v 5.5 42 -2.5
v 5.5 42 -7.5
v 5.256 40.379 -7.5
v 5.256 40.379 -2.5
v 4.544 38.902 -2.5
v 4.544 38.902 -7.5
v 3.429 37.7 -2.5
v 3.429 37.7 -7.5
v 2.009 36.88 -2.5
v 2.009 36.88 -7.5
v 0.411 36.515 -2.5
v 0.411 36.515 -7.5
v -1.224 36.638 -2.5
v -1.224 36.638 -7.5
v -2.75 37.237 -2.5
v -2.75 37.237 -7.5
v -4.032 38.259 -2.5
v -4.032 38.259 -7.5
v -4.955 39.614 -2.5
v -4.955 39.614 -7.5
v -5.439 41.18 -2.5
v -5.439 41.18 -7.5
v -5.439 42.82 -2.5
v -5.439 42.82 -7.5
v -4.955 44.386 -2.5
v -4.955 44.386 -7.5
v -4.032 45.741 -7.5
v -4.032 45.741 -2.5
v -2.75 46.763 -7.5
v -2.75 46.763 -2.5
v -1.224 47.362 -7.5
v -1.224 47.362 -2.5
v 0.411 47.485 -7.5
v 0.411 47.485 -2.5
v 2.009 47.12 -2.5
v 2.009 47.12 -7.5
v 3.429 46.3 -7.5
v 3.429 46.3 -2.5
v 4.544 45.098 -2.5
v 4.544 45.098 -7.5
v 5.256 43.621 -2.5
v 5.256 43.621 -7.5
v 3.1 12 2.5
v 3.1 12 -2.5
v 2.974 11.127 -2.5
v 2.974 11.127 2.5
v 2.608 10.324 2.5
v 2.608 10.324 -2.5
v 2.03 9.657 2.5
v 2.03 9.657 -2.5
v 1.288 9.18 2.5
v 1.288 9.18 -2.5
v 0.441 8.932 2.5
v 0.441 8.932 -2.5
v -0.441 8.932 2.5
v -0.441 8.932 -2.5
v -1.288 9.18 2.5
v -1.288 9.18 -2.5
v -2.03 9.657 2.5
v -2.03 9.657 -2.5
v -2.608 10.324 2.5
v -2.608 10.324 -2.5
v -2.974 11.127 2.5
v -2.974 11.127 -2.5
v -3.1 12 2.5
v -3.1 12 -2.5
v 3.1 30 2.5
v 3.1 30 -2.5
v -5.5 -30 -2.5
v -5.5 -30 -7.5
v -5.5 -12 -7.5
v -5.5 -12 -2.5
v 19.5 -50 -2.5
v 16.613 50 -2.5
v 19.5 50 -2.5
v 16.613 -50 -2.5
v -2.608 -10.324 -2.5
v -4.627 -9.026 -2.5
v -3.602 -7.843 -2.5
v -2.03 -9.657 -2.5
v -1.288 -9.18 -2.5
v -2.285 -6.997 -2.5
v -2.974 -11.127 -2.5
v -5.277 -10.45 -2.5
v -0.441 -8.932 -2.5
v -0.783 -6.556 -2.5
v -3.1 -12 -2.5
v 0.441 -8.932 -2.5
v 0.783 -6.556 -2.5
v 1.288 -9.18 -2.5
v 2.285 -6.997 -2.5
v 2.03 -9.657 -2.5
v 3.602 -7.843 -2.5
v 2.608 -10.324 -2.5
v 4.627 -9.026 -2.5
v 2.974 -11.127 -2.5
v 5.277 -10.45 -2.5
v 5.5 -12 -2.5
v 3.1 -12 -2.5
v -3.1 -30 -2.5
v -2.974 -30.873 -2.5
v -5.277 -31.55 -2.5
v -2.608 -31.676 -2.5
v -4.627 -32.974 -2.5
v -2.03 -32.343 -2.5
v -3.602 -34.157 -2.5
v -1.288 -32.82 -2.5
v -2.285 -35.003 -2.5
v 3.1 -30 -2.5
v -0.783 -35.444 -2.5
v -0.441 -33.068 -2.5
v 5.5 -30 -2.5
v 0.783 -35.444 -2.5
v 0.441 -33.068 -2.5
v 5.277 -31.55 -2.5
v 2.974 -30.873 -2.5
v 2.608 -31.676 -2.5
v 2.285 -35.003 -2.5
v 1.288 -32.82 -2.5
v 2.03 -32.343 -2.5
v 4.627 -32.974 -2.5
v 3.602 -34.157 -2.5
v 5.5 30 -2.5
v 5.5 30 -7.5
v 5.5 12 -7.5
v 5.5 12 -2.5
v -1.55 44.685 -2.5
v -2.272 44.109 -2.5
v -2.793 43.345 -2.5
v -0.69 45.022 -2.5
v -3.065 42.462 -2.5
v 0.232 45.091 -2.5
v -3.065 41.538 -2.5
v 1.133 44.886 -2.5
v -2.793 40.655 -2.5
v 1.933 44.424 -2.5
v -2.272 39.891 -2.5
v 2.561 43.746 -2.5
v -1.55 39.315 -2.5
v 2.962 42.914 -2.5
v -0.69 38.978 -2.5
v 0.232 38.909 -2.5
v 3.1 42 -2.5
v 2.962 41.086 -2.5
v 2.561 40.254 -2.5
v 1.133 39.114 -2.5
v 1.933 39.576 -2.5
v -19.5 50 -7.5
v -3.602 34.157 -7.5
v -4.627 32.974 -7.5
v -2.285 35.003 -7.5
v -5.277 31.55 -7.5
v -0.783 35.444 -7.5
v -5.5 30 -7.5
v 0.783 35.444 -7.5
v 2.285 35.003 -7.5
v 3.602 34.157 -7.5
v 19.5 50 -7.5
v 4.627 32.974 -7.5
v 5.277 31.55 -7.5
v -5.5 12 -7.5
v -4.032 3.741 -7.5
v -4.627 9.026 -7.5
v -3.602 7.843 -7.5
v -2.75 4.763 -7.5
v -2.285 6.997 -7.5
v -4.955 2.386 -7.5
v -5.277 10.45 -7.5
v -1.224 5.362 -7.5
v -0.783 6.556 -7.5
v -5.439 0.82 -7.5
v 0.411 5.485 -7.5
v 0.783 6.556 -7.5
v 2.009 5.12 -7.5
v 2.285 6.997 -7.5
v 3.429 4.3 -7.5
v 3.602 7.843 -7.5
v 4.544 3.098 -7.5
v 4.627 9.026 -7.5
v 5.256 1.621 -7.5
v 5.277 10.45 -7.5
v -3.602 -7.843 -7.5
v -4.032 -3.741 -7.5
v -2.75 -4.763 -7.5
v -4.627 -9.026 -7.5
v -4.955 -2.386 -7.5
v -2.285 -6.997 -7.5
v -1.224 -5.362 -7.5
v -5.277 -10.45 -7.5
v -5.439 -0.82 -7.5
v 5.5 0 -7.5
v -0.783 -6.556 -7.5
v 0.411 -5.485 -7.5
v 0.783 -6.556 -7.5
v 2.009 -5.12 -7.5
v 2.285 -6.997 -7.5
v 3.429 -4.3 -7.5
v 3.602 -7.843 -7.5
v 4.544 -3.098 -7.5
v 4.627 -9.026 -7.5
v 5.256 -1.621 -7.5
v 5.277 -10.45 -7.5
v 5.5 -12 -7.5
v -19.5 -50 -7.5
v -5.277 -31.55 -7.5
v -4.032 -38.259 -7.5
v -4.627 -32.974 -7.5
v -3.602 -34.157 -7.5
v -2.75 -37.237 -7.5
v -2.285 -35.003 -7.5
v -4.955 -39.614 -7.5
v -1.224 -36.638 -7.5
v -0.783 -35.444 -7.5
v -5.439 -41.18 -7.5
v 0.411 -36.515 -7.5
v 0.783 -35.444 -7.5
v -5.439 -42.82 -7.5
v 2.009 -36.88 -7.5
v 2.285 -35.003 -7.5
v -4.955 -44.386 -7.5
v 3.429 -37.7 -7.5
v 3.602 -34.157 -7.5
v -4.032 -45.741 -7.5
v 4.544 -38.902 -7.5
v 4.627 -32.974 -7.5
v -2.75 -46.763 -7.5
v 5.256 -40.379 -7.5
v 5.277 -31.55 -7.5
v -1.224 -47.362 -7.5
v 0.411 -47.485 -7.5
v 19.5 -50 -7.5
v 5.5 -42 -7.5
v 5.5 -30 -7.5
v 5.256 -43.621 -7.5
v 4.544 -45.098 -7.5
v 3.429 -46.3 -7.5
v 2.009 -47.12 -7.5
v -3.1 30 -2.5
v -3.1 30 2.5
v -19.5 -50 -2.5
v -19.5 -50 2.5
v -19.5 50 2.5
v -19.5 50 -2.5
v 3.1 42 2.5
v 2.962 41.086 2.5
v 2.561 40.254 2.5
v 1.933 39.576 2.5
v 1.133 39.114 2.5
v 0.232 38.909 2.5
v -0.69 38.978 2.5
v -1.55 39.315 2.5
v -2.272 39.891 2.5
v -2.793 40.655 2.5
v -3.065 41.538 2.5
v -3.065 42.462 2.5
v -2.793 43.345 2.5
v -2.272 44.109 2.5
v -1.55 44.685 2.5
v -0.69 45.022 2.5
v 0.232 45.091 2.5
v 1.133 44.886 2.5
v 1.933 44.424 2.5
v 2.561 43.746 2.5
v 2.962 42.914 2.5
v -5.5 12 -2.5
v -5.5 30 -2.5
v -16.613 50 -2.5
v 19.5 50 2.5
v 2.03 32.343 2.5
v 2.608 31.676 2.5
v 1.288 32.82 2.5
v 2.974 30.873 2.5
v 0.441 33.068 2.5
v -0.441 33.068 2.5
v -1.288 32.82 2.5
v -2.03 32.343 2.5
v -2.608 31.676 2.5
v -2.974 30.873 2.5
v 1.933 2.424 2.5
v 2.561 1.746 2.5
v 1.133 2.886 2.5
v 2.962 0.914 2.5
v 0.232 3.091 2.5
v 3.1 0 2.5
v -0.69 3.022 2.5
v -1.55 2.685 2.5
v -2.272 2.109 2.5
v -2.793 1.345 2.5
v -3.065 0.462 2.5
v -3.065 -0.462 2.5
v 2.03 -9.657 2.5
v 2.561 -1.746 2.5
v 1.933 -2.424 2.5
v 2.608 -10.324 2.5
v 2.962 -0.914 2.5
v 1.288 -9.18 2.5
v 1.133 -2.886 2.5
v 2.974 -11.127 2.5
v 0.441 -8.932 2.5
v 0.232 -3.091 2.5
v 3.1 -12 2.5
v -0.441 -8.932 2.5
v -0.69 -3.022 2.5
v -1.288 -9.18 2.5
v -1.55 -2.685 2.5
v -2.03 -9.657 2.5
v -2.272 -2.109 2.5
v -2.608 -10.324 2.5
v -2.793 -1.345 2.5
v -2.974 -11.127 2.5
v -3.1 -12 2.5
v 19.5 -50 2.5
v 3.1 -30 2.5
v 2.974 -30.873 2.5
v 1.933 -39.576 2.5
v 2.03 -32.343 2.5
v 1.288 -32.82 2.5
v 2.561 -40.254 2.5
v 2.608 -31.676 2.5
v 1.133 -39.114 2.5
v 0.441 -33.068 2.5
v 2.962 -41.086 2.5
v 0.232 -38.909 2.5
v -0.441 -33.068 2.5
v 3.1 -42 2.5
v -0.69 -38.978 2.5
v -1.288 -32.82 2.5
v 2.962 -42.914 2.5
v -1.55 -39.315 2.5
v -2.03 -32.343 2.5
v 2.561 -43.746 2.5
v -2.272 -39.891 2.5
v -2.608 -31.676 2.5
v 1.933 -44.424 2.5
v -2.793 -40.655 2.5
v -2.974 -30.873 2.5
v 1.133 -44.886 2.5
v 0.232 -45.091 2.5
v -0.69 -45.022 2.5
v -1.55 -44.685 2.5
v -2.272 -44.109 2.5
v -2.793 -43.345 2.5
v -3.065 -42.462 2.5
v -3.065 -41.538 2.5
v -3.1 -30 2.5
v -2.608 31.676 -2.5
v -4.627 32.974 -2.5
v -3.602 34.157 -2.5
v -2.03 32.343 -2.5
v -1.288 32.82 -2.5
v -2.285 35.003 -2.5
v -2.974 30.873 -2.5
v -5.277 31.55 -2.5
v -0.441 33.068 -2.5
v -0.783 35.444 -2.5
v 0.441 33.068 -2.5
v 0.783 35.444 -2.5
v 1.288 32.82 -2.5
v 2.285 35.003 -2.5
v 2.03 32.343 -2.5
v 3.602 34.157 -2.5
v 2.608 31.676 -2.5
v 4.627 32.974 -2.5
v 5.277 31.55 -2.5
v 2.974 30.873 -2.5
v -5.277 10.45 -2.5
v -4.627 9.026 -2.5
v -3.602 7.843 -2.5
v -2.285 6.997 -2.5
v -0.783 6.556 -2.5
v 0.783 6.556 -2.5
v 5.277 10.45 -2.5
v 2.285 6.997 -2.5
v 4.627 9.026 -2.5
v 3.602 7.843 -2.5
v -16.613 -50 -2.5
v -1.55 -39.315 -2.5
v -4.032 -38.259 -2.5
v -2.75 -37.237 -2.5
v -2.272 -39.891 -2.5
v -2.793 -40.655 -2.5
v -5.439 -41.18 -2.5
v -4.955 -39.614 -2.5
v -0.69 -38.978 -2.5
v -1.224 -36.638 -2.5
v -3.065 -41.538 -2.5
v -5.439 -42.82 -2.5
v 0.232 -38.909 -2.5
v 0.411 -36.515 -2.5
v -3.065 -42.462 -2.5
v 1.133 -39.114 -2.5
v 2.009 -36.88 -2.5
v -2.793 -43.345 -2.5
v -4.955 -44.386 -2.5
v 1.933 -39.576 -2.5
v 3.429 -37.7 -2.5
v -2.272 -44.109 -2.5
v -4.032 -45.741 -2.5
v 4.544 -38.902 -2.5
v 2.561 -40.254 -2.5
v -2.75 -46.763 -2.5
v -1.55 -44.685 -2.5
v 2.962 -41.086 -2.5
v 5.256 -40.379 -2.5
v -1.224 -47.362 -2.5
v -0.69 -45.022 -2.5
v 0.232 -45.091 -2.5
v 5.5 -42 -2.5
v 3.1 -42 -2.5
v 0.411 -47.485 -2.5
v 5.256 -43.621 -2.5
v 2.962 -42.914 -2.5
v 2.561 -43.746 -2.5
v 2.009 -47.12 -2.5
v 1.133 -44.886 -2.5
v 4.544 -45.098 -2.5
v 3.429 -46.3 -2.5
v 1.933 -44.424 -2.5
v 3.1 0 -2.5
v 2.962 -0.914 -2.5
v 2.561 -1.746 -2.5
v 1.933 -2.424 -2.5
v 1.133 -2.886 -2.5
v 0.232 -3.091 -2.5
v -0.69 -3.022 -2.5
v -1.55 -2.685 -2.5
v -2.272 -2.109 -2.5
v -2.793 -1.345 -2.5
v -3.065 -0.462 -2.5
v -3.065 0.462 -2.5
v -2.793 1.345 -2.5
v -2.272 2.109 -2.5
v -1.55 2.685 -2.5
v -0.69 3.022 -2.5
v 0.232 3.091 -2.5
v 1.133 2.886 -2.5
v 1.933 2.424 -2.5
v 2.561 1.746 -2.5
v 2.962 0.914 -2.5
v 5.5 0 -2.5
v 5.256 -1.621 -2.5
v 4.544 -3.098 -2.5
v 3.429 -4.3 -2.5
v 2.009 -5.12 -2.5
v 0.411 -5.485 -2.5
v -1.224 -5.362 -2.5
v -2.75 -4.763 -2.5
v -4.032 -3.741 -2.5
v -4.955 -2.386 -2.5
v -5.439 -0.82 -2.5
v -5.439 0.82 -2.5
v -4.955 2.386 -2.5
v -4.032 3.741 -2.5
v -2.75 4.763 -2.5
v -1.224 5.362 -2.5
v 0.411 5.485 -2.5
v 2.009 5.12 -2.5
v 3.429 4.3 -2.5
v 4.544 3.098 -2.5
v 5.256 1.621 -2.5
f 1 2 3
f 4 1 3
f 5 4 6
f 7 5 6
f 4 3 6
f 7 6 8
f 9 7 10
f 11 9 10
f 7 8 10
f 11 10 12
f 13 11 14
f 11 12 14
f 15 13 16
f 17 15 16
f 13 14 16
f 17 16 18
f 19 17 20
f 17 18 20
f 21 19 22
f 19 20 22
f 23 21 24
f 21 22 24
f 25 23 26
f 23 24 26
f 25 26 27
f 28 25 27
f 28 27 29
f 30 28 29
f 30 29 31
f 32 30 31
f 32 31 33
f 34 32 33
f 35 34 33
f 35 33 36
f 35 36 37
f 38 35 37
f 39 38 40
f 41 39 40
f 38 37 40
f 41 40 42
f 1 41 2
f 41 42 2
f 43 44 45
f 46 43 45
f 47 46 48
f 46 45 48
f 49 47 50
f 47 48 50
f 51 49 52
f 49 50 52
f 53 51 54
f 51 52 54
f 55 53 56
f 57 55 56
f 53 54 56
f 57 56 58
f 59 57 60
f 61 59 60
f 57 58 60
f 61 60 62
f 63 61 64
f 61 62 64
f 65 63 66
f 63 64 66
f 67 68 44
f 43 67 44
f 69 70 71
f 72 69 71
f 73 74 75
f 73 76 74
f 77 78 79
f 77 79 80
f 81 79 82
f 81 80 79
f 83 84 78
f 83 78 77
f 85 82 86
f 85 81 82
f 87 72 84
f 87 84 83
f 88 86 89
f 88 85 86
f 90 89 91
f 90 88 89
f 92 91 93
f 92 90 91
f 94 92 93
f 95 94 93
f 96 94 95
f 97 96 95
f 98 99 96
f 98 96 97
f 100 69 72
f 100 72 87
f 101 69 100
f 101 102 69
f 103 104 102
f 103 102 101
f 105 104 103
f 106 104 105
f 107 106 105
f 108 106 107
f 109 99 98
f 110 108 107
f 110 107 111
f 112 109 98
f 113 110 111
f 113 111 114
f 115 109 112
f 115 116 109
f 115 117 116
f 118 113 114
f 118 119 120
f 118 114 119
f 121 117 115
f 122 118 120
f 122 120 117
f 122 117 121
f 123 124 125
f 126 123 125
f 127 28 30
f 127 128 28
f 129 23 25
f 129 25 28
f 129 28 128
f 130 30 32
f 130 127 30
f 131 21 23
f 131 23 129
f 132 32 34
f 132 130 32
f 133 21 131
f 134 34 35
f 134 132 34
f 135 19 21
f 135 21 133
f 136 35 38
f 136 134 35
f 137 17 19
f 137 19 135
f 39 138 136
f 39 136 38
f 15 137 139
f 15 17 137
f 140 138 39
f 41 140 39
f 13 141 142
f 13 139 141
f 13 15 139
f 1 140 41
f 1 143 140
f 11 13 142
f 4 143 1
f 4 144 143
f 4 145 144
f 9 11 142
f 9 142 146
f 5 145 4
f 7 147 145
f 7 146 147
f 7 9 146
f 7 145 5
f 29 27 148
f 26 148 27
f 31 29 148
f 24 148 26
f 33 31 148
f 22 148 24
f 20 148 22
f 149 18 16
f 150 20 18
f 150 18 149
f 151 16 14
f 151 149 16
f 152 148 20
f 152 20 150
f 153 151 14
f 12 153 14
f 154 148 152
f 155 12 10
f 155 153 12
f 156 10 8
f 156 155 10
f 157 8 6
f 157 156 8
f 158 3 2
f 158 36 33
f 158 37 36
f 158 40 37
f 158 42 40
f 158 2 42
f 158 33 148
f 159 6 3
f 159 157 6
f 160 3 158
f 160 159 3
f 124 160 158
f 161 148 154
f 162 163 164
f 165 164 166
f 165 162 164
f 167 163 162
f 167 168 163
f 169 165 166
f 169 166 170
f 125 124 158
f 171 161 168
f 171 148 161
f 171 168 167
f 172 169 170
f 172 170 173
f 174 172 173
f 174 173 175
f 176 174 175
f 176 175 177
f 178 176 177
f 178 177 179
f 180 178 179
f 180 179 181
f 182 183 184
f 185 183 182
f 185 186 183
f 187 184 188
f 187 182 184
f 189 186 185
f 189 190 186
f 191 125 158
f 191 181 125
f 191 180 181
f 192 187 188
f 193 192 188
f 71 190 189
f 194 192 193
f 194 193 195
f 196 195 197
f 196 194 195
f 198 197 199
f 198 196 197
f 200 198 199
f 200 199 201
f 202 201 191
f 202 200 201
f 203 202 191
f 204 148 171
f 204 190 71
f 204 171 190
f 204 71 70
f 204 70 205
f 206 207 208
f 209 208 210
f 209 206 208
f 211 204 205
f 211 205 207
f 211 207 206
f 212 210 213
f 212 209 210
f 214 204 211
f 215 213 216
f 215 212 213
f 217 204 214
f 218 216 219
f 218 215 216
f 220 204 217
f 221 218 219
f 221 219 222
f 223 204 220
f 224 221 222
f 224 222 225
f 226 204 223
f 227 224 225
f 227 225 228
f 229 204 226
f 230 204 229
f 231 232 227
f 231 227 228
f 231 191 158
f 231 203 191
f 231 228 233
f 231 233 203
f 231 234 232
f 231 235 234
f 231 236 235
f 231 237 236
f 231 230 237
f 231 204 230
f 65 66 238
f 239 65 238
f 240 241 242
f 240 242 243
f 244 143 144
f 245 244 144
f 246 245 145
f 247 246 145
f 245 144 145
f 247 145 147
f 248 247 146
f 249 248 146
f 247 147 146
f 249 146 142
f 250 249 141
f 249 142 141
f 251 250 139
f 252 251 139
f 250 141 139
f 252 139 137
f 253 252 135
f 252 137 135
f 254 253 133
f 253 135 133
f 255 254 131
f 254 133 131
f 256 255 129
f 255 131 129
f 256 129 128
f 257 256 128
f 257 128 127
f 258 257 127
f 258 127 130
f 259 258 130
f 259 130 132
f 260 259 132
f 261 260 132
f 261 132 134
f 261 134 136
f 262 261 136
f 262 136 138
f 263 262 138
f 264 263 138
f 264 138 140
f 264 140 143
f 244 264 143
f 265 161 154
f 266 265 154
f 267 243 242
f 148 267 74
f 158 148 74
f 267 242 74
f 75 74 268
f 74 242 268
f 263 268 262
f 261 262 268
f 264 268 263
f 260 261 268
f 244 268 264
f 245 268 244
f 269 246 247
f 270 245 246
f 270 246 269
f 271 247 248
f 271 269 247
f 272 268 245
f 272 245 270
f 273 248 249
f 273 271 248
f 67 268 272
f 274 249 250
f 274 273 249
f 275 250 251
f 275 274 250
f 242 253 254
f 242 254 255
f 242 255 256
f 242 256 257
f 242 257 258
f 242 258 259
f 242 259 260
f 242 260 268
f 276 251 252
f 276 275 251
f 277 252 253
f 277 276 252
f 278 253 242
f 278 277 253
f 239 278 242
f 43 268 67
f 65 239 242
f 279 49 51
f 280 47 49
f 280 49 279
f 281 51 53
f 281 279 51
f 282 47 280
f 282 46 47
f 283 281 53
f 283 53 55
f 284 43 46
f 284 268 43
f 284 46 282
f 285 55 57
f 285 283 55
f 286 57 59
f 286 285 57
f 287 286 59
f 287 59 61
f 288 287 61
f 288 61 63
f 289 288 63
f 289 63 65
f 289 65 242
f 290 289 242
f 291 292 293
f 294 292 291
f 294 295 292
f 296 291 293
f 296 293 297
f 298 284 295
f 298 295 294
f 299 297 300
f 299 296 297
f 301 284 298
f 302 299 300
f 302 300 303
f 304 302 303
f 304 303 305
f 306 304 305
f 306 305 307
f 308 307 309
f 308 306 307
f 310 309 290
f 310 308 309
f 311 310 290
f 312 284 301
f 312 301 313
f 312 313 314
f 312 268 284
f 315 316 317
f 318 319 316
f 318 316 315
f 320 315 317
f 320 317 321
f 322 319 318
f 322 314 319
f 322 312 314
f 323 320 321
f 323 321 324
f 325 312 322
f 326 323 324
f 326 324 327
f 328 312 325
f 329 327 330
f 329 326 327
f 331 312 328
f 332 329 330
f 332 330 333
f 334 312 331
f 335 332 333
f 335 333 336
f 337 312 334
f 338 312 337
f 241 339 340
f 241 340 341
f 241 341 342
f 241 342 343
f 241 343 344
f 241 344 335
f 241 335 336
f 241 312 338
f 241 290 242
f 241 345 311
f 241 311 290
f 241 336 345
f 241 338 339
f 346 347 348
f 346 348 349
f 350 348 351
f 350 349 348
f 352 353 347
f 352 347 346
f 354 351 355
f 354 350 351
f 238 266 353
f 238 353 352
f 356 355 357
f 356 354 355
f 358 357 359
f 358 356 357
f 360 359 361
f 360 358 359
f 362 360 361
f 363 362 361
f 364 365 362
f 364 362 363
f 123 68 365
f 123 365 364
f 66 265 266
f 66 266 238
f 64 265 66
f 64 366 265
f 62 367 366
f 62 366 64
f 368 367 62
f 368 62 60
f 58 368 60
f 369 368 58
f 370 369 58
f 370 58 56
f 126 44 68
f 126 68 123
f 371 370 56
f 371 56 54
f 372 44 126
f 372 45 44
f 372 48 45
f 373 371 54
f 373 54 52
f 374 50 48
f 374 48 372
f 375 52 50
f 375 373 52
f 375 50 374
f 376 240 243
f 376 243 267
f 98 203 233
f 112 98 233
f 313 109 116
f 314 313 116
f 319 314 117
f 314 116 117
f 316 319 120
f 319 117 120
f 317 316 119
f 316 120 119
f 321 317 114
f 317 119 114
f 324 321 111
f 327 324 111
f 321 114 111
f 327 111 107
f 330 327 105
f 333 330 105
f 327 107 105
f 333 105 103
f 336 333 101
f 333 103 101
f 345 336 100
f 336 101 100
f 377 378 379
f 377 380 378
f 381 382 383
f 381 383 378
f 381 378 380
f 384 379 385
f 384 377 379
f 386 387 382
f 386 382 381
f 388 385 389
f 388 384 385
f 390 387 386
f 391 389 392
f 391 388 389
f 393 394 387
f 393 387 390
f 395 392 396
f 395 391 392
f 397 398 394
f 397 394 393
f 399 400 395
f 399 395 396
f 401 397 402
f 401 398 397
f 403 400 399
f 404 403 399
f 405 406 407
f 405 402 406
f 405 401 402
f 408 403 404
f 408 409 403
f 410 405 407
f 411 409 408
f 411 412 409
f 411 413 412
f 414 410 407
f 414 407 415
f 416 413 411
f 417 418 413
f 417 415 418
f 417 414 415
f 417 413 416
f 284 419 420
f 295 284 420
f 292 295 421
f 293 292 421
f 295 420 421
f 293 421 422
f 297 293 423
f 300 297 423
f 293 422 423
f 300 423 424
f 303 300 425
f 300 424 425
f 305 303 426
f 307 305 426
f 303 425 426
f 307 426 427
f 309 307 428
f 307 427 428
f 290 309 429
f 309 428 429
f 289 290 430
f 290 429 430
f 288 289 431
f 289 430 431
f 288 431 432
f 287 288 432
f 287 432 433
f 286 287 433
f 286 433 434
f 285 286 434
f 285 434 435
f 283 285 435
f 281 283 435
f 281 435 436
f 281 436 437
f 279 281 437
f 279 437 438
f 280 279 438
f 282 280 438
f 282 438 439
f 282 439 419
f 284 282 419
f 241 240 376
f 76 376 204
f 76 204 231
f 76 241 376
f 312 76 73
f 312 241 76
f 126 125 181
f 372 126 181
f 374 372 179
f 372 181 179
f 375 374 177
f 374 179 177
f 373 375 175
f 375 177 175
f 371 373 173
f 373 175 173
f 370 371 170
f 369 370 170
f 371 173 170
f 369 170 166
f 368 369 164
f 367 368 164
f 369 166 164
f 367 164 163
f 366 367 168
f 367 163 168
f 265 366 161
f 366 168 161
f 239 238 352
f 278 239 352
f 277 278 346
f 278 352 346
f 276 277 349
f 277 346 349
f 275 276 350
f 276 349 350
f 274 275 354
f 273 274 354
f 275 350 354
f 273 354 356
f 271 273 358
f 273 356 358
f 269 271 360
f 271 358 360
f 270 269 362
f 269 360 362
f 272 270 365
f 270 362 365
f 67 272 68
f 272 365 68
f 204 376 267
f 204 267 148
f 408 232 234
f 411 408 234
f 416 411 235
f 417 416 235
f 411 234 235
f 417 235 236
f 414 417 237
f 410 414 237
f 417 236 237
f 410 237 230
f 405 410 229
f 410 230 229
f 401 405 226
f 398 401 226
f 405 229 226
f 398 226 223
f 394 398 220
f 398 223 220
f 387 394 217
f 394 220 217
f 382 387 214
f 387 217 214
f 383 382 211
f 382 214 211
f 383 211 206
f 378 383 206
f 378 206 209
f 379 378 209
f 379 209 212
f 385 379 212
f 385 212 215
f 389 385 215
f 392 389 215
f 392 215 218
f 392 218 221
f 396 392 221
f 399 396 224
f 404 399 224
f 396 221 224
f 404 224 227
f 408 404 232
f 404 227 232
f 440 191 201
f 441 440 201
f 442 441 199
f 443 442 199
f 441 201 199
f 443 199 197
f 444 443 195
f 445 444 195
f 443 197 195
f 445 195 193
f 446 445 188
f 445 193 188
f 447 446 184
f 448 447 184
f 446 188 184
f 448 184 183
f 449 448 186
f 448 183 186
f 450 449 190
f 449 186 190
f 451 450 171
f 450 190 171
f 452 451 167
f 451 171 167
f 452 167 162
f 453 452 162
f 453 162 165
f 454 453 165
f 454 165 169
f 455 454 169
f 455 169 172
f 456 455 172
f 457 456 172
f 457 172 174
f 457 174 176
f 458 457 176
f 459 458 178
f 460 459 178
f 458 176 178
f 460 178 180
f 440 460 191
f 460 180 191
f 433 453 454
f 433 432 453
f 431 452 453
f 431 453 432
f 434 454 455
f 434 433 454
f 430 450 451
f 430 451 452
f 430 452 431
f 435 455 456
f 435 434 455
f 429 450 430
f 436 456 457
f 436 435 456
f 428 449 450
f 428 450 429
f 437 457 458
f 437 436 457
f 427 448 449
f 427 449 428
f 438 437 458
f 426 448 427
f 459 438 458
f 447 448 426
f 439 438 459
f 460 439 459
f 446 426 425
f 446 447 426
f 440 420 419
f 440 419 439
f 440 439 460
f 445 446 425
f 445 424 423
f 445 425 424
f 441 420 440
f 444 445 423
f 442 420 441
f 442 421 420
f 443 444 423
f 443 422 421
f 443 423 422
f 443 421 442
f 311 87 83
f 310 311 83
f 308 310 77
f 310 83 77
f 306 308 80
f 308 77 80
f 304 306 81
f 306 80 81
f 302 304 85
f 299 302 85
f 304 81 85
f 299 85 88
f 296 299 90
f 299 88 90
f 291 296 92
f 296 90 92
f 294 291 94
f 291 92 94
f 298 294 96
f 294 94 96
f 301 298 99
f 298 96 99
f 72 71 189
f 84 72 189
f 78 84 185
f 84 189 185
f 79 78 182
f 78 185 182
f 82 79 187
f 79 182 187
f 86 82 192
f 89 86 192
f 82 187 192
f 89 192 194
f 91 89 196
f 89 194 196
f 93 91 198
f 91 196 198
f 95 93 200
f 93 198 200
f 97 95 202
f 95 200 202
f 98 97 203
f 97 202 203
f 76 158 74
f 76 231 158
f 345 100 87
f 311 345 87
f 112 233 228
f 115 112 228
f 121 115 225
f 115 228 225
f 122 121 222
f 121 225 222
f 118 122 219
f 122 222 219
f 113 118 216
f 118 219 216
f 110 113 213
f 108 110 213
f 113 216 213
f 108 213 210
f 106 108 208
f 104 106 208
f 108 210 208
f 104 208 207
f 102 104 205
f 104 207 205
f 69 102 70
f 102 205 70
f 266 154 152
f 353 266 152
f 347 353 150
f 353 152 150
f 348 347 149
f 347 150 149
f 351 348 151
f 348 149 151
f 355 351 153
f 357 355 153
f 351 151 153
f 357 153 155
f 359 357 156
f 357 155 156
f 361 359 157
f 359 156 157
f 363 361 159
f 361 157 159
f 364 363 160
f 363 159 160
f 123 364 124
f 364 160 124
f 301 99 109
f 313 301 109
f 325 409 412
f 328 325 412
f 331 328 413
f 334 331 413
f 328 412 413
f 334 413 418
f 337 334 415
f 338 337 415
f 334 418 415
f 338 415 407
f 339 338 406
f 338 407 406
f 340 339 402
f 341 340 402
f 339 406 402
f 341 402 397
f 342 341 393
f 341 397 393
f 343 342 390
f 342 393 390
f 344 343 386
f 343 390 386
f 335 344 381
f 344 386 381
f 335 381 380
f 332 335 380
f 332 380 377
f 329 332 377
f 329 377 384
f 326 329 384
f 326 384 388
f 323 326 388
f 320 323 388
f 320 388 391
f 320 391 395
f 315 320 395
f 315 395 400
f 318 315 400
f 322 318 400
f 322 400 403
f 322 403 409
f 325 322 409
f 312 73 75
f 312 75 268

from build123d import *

# Parameters (mm, degrees)
F1_DEPTH = 50
F2_R     = 5.5
F3_DEPTH = 5
F4_R     = 3.1
F5_DEPTH = 5.001


with BuildPart() as f1:
    # F0 (on Front) → F1 (new body, symmetric)
    with BuildSketch(Plane.XZ):
        Polygon((16.613249, -2.5), (19.5, -2.5), (19.5, 2.5), (-19.5, 2.5), (-19.5, -2.5), (-16.613249, -2.5), (-19.5, -7.5), (19.5, -7.5), align=None)
    extrude(amount=F1_DEPTH, both=True)

    # F2 (on face) → F3 (cut)
    with BuildSketch(Plane(origin=(0, 0, -7.5), x_dir=(1, 0, 0), z_dir=(0, 0, -1))):
        Circle(F2_R)
        with Locations((0, -42)):
            Circle(F2_R)
        with Locations((0, 42)):
            Circle(F2_R)
        with BuildLine():
            ThreePointArc((-5.5, -30), (0, -35.5), (5.5, -30))
            ThreePointArc((5.5, -30), (0, -24.5), (-5.5, -30))
        make_face()
        with BuildLine():
            ThreePointArc((-5.5, -30), (0, -24.5), (5.5, -30))
            Line((5.5, -30), (5.5, -12))
            ThreePointArc((5.5, -12), (0, -17.5), (-5.5, -12))
            Line((-5.5, -12), (-5.5, -30))
        make_face()
        with BuildLine():
            ThreePointArc((-5.5, -12), (0, -17.5), (5.5, -12))
            ThreePointArc((5.5, -12), (0, -6.5), (-5.5, -12))
        make_face()
        with BuildLine():
            ThreePointArc((-5.5, 12), (0, 6.5), (5.5, 12))
            ThreePointArc((5.5, 12), (0, 17.5), (-5.5, 12))
        make_face()
        with BuildLine():
            ThreePointArc((-5.5, 12), (0, 17.5), (5.5, 12))
            Line((5.5, 12), (5.5, 30))
            ThreePointArc((5.5, 30), (0, 24.5), (-5.5, 30))
            Line((-5.5, 30), (-5.5, 12))
        make_face()
        with BuildLine():
            ThreePointArc((-5.5, 30), (0, 24.5), (5.5, 30))
            ThreePointArc((5.5, 30), (0, 35.5), (-5.5, 30))
        make_face()
    extrude(amount=-F3_DEPTH, mode=Mode.SUBTRACT)

    # F4 (on face) → F5 (cut, through all)
    with BuildSketch(Plane(origin=(0, 0, -2.5), x_dir=(1, 0, 0), z_dir=(0, 0, -1))):
        with Locations((0, -42)):
            Circle(F4_R)
        Circle(F4_R)
        with Locations((0, 42)):
            Circle(F4_R)
        with BuildLine():
            ThreePointArc((-3.1, -30), (0, -33.1), (3.1, -30))
            ThreePointArc((3.1, -30), (0, -26.9), (-3.1, -30))
        make_face()
        with BuildLine():
            ThreePointArc((-3.1, -30), (0, -26.9), (3.1, -30))
            Line((3.1, -30), (3.1, -12))
            ThreePointArc((3.1, -12), (0, -15.1), (-3.1, -12))
            Line((-3.1, -12), (-3.1, -30))
        make_face()
        with BuildLine():
            ThreePointArc((-3.1, -12), (0, -15.1), (3.1, -12))
            ThreePointArc((3.1, -12), (0, -8.9), (-3.1, -12))
        make_face()
        with BuildLine():
            ThreePointArc((-3.1, 12), (0, 8.9), (3.1, 12))
            ThreePointArc((3.1, 12), (0, 15.1), (-3.1, 12))
        make_face()
        with BuildLine():
            ThreePointArc((-3.1, 12), (0, 15.1), (3.1, 12))
            Line((3.1, 12), (3.1, 30))
            ThreePointArc((3.1, 30), (0, 26.9), (-3.1, 30))
            Line((-3.1, 30), (-3.1, 12))
        make_face()
        with BuildLine():
            ThreePointArc((-3.1, 30), (0, 26.9), (3.1, 30))
            ThreePointArc((3.1, 30), (0, 33.1), (-3.1, 30))
        make_face()
    extrude(amount=-F5_DEPTH, mode=Mode.SUBTRACT)


solid = f1.part
